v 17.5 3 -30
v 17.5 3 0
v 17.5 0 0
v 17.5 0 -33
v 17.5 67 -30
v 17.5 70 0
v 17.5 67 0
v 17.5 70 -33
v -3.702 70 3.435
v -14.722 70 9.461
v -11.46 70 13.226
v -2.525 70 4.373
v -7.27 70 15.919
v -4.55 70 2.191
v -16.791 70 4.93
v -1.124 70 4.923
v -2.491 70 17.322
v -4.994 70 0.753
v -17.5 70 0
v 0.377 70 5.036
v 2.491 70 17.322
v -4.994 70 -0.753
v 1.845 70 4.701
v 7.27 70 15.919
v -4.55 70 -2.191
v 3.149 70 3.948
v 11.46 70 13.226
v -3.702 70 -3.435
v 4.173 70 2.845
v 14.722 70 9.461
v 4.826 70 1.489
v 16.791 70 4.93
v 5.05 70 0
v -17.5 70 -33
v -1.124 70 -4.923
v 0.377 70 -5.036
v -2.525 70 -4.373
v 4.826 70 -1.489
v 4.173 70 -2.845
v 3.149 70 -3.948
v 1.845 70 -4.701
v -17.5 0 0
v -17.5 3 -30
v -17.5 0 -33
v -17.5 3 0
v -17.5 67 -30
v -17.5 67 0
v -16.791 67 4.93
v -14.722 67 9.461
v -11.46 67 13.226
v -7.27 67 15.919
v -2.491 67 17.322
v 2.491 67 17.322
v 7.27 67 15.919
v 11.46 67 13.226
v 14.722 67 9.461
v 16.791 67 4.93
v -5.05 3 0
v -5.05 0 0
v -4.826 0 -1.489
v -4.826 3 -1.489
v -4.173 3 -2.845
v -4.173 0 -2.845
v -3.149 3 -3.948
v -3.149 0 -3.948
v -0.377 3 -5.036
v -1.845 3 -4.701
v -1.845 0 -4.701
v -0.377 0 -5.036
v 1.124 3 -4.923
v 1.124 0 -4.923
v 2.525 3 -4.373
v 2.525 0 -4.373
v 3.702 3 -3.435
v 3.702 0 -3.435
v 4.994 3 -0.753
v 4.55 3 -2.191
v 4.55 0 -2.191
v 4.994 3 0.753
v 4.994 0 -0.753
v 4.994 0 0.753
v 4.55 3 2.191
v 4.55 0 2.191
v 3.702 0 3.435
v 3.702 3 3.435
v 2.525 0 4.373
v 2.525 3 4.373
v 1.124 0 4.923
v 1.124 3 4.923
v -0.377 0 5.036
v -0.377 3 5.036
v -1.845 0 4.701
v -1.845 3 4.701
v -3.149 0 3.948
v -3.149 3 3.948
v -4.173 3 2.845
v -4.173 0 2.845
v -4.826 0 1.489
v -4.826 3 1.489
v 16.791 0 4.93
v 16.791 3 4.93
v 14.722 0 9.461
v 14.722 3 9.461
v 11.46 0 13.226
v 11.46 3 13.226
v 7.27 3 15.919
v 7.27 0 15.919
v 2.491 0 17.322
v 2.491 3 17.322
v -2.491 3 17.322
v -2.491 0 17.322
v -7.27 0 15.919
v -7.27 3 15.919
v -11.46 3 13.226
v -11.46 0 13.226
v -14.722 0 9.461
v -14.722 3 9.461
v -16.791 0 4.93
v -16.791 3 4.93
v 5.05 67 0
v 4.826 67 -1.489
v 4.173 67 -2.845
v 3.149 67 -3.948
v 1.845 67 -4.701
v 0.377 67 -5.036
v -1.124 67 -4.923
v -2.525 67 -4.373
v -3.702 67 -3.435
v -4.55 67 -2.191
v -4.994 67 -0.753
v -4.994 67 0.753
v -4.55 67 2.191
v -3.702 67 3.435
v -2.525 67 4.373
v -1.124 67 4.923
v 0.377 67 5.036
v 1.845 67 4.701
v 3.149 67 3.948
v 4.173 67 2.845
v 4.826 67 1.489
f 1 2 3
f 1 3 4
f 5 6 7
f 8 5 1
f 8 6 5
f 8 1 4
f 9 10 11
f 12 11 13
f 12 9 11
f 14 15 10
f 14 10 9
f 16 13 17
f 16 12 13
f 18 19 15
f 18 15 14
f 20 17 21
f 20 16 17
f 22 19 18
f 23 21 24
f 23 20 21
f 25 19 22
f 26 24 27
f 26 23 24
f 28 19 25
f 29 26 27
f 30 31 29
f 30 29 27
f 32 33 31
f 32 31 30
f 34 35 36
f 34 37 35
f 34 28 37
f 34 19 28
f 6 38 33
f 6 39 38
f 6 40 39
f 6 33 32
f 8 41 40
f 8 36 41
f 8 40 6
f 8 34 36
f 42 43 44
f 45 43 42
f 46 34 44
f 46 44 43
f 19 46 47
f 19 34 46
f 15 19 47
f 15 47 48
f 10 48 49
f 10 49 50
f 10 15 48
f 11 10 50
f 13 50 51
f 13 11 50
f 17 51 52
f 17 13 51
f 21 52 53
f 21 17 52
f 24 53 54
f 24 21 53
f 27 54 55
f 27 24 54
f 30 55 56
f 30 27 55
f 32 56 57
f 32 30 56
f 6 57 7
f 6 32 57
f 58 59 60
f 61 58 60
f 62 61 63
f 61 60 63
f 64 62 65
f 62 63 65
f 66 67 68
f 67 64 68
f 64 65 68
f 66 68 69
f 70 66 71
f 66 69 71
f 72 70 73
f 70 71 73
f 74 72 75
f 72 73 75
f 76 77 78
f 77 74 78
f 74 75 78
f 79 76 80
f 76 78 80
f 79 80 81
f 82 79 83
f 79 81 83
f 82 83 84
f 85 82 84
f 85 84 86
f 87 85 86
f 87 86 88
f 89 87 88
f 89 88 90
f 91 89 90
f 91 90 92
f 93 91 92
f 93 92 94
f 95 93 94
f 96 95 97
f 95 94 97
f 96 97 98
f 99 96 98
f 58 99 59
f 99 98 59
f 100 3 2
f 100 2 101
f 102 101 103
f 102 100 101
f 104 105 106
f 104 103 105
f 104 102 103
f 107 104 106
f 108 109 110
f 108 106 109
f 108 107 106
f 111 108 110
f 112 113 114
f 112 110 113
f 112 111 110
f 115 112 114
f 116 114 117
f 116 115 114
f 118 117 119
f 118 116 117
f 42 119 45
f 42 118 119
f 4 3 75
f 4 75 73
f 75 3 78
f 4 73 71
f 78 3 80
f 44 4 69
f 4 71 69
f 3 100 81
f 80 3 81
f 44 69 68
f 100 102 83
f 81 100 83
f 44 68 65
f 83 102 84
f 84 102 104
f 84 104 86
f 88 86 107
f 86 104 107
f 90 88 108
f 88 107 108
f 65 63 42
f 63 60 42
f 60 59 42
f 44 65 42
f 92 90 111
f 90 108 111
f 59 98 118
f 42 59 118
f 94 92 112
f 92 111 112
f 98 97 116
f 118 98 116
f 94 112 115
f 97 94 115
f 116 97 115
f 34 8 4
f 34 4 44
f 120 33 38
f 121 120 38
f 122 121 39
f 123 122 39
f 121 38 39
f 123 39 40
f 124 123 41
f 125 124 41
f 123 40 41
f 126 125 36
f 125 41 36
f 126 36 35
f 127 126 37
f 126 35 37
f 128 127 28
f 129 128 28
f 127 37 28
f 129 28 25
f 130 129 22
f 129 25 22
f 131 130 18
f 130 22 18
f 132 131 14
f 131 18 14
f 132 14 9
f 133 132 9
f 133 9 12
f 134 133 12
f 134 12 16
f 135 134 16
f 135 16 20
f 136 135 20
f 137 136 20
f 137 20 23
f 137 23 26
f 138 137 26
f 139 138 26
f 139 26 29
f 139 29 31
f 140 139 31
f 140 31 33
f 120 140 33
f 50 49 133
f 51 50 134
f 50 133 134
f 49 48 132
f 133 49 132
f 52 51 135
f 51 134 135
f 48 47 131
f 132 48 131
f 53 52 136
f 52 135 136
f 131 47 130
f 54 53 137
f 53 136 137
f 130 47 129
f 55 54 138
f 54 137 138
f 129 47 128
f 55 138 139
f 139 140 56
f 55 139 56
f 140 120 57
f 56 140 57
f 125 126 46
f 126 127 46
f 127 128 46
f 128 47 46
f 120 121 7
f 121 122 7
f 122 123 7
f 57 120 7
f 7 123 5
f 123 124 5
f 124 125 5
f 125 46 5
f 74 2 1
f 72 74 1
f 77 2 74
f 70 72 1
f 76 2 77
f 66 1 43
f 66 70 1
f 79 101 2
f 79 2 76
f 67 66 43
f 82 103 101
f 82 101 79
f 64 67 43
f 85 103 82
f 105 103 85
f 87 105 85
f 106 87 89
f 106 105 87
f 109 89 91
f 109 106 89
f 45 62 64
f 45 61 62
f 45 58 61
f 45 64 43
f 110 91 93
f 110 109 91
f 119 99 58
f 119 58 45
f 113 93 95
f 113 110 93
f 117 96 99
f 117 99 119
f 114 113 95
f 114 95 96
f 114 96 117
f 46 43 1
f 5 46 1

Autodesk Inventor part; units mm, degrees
ref_plane "YZ Plane" through (0, 0, 0) normal (1, 0, 0) x (0, 1, 0)
ref_plane "XZ Plane" through (0, 0, 0) normal (0, 1, 0) x (-1, 0, 0)
ref_plane "XY Plane" through (0, 0, 0) normal (0, 0, 1) x (1, 0, 0)
sketch "Sketch1" plane through (0, 0, 0) normal (0, 1, 0) x (-1, 0, 0)
  line L0 (0, -43.1) -> (0, 27.6) construction
  line L1 (-31.1, 0) -> (64.1, 0) construction
  arc A0 (17.5, 0) -> (-17.5, 0) centre (0, 0) ccw
  line L2 (17.5, 0) -> (17.5, -33)
  line L3 (17.5, 0) -> (50.5, 0) construction
  line L4 (-17.5, 0) -> (-17.5, -33)
  line L5 (-17.5, -33) -> (17.5, -33)
  circle A1 centre (0, 0) radius 5.05
  dimension "d0" = 35
  dimension "d1" = 33
  dimension "d2" = 90
  dimension "d3" = 10.1
extrude "Extrusion1" add sketch "Sketch1" along normal blind 3
sketch "Sketch5" plane through (0, 0, 0) normal (0, -1, 0) x (1, 0, 0)
  circle A0 centre (0, 0) radius 5.05 construction
  arc A1 (17.5, 0) -> (-17.5, 0) centre (0, 0) ccw construction
  line L0 (-17.5, -33) -> (-17.5, 0) construction
  line L1 (17.5, -33) -> (-17.5, -33) construction
  line L2 (17.5, 0) -> (17.5, -33) construction
  line L3 (17.5, 0) -> (17.5, -33) projected
  line L4 (-17.5, -33) -> (-17.5, 0) projected
  line L5 (17.5, -33) -> (-17.5, -33)
  line L6 (-17.5, -33) -> (-17.5, -30)
  line L7 (-17.5, -30) -> (17.5, -30)
  line L8 (17.5, -30) -> (17.5, -33)
  dimension "d11" = 3
extrude "Extrusion4" add sketch "Sketch5" against normal blind 70
sketch "Sketch6" plane through (0, 70, 0) normal (0, 1, 0) x (1, 0, 0)
  line L0 (17.5, 0) -> (17.5, 33) projected
  arc A0 (-17.5, 0) -> (17.5, 0) centre (0, 0) ccw projected
  line L1 (-17.5, 33) -> (-17.5, 0) projected
  line L2 (17.5, 33) -> (-17.5, 33) projected
  circle A1 centre (0, 0) radius 5.05 projected
extrude "Extrusion5" add sketch "Sketch6" against normal blind 3
properties part number "steering_kingpin_bracket" material "Steel, Mild"
